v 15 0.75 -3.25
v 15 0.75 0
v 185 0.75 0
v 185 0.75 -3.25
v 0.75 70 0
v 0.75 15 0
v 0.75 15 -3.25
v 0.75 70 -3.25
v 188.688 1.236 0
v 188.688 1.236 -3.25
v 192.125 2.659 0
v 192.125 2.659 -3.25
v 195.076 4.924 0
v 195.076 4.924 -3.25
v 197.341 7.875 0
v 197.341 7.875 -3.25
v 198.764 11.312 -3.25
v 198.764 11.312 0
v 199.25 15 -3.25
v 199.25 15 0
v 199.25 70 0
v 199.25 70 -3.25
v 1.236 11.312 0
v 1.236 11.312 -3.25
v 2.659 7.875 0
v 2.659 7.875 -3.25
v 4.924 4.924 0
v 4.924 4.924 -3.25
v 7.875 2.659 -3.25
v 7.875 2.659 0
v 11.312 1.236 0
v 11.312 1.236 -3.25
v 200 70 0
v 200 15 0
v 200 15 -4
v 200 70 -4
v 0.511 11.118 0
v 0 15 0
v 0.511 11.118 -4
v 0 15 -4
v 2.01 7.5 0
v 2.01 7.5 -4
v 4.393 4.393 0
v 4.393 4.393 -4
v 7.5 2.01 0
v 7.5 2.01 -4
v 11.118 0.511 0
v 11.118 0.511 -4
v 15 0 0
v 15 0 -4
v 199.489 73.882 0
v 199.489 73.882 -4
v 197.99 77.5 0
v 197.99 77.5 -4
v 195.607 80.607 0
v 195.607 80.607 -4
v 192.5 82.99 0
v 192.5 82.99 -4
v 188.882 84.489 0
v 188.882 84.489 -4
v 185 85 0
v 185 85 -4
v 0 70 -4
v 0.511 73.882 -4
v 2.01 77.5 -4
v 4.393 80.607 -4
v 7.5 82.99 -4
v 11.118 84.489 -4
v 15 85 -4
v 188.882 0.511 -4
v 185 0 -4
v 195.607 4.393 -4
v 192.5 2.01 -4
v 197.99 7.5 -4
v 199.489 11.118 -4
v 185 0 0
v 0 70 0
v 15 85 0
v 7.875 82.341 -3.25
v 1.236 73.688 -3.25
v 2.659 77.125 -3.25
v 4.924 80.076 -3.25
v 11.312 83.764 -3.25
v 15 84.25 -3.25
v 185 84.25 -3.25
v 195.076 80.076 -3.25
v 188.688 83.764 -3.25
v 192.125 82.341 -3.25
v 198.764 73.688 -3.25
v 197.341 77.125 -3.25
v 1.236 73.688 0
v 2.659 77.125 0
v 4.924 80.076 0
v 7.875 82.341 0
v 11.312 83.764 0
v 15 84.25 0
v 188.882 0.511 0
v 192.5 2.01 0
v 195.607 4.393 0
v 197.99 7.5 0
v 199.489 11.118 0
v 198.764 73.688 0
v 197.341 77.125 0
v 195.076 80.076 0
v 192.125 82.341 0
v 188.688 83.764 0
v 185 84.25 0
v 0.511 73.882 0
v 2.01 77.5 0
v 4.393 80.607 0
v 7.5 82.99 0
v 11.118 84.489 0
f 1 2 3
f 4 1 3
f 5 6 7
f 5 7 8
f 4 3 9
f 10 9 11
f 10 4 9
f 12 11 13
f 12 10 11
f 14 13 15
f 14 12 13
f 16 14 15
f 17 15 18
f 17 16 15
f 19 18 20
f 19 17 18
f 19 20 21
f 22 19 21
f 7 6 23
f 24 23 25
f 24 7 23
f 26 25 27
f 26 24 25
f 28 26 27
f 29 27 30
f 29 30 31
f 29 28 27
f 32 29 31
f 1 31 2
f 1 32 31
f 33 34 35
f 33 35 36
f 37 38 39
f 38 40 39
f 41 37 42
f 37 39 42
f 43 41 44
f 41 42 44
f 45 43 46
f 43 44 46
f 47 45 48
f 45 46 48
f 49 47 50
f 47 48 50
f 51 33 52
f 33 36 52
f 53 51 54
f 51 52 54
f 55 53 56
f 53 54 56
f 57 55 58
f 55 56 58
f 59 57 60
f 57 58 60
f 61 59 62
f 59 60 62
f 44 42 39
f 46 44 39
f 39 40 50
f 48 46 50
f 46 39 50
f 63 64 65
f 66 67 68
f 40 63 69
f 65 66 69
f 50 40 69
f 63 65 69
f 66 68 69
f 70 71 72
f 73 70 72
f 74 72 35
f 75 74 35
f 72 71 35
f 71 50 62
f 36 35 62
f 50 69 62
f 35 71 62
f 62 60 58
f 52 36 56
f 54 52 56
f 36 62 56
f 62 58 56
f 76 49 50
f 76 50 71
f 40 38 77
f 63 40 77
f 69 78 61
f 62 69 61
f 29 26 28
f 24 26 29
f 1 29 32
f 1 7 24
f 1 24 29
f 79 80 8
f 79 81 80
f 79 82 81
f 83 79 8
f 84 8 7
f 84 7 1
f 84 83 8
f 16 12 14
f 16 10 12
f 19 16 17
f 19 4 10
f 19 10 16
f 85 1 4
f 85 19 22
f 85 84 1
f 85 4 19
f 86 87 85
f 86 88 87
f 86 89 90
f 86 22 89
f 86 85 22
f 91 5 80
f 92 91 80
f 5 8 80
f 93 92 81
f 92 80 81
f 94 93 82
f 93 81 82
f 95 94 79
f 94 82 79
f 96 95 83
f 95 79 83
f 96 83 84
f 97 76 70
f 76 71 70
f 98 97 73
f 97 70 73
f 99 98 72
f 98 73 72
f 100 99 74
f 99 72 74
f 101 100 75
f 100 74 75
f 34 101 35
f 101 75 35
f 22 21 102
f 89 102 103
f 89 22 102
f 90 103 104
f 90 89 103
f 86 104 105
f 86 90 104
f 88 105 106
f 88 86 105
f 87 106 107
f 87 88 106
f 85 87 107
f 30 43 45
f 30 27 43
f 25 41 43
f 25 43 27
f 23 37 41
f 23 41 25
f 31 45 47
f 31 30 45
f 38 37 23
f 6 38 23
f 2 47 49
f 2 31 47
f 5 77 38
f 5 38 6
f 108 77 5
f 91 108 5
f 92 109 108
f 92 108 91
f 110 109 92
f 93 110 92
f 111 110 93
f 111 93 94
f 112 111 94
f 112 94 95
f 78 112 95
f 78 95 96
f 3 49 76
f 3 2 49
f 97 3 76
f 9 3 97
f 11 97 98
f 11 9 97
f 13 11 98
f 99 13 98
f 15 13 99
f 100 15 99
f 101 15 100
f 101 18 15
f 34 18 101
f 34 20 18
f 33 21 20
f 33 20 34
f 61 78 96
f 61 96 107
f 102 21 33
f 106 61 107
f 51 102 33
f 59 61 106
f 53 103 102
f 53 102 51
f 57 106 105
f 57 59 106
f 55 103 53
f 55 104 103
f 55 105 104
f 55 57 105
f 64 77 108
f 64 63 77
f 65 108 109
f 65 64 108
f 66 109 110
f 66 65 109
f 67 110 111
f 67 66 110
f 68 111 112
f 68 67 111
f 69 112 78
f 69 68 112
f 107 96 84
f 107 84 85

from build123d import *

# Parameters (mm, degrees)
F0_W     = 200
F0_H     = 85
F1_DEPTH = 4
F2_R     = 15
F3_T     = -0.75


with BuildPart() as f1:
    # F0 (on Top) → F1 (new body)
    with BuildSketch(Plane.XY):
        with Locations((100, 42.5)):
            Rectangle(F0_W, F0_H)
    extrude(amount=-F1_DEPTH)

    # F2
    f2_edges = [f1.edges().sort_by_distance(p)[0] for p in [
        (0, 0, -2),
        (200, 0, -2),
        (200, 85, -2),
        (0, 85, -2),
    ]]
    fillet(f2_edges, radius=F2_R)

    # F3
    f3_openings = [f1.faces().sort_by_distance(p)[0] for p in [
        (100, 42.5, 0),
    ]]
    offset(amount=F3_T, openings=f3_openings)


solid = f1.part
